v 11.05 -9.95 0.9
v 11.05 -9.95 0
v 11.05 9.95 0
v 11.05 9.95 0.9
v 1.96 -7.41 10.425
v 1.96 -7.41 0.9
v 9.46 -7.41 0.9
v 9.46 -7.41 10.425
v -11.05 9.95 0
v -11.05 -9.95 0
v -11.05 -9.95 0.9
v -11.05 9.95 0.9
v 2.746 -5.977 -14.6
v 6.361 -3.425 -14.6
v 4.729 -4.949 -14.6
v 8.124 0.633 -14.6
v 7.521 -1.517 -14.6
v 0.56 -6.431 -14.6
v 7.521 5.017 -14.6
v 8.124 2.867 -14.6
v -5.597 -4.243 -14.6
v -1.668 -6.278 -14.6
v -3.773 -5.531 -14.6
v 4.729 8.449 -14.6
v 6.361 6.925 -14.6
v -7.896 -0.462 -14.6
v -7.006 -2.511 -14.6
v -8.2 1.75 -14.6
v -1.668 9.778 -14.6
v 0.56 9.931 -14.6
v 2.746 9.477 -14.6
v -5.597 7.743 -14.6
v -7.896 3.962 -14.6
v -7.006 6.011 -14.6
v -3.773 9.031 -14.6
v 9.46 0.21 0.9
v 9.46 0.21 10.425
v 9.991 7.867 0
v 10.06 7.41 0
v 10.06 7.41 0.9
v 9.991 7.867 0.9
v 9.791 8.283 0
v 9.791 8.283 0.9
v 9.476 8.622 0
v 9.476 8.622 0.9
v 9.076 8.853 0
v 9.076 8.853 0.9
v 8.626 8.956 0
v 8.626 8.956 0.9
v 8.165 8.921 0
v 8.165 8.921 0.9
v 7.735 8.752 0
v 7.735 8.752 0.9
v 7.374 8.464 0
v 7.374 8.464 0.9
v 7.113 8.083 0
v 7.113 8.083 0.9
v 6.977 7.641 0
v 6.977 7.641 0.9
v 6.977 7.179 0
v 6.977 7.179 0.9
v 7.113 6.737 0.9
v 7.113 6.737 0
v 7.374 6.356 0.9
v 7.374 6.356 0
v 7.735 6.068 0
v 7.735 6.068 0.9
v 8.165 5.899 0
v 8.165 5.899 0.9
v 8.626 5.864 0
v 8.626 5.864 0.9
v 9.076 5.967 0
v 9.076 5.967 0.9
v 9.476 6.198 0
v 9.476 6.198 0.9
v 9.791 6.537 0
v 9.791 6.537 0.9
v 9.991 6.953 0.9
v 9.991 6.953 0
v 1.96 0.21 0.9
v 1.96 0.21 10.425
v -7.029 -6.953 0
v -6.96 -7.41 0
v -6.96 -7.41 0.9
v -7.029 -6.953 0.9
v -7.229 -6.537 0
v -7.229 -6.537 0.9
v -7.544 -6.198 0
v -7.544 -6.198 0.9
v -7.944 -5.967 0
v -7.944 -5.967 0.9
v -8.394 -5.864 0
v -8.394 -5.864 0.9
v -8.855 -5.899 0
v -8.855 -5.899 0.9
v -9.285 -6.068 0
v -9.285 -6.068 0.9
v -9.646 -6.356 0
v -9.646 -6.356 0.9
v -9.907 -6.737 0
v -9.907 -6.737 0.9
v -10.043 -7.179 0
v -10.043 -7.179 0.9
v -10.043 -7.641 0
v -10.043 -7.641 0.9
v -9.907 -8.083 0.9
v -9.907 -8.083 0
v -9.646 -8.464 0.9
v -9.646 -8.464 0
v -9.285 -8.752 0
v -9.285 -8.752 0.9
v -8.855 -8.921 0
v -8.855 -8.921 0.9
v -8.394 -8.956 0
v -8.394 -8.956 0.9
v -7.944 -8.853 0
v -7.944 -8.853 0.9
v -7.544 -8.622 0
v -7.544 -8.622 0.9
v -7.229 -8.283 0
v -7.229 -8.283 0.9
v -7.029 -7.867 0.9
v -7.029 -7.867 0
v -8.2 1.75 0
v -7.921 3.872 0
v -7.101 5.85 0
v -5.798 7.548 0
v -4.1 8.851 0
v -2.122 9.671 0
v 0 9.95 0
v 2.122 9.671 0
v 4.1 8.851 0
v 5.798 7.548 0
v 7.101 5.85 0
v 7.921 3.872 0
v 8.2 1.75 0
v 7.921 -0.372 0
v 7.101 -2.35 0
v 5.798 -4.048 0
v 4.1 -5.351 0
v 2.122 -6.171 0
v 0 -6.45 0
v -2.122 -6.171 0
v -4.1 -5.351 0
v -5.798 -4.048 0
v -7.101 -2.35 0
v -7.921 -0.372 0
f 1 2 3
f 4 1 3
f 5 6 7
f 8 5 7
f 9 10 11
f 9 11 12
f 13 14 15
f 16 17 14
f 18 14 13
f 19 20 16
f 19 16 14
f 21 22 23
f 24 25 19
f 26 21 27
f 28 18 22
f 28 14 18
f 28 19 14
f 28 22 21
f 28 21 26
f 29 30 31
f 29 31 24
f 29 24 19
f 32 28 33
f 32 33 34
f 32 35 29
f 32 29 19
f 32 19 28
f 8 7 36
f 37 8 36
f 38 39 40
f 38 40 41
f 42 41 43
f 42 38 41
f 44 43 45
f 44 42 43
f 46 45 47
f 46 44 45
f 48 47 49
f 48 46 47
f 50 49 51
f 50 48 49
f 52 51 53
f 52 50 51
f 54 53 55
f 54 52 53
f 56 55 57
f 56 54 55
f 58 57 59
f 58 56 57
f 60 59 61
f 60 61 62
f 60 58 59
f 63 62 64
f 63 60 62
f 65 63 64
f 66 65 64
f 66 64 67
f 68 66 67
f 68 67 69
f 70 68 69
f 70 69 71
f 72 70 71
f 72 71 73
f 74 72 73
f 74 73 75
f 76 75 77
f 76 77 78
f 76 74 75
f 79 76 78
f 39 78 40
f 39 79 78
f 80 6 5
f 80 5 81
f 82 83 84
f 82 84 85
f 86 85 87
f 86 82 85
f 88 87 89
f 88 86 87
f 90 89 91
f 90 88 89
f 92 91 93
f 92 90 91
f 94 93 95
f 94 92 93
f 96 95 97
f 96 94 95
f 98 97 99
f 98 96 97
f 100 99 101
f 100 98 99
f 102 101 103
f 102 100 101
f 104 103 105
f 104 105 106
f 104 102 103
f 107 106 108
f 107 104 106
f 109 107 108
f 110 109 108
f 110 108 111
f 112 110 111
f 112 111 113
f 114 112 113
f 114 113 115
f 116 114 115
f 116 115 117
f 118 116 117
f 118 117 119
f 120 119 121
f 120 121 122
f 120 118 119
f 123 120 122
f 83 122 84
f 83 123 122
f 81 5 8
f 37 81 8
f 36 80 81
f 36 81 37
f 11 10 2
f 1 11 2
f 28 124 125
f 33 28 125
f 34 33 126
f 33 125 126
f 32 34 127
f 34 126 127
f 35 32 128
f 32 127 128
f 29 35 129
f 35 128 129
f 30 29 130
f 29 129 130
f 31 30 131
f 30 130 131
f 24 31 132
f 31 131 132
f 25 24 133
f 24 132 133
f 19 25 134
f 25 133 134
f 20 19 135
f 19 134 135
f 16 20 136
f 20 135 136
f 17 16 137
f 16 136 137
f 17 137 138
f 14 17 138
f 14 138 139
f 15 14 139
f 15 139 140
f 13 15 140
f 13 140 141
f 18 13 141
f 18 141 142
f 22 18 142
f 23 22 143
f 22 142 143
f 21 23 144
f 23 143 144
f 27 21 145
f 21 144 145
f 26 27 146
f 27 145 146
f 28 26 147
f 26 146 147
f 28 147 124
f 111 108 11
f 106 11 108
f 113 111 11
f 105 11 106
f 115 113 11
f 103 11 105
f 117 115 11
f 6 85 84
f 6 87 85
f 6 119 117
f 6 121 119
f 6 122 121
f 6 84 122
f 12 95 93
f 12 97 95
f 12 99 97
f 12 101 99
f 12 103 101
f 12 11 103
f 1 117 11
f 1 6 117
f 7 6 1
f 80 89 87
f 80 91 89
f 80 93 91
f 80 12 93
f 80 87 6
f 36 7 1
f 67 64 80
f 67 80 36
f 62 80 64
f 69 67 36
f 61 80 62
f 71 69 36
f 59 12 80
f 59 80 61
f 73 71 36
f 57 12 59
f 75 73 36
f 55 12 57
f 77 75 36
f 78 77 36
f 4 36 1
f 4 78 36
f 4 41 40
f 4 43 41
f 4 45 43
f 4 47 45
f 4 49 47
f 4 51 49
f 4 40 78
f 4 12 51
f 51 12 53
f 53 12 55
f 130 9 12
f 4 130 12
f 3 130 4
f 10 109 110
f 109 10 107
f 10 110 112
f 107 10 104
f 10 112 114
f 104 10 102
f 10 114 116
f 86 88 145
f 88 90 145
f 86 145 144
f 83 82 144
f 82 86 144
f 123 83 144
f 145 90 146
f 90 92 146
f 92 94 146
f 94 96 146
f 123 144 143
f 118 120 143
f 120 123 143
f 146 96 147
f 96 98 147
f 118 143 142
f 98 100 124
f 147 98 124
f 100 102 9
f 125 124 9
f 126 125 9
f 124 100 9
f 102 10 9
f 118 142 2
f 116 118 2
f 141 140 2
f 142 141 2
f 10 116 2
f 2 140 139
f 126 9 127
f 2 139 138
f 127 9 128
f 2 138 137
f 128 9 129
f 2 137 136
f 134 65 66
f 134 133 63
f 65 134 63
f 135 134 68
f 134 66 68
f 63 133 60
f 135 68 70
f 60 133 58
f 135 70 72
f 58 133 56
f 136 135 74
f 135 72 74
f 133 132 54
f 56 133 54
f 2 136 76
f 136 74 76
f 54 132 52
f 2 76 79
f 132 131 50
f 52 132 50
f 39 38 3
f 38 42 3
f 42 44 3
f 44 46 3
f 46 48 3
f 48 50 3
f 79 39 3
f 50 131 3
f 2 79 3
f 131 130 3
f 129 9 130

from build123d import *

# Parameters (mm, degrees)
SKETCH2_W           = 22.1
SKETCH2_H           = 19.9
SKETCH2_R           = 1.55
BOSS_EXTRUDE1_DEPTH = 0.9
SKETCH3_W           = 7.5
SKETCH3_H           = 7.62
BOSS_EXTRUDE2_DEPTH = 9.525
SKETCH4_R           = 8.2
BOSS_EXTRUDE3_DEPTH = 14.6


with BuildPart() as part:
    # Sketch2 → Boss-Extrude1 (new body)
    with BuildSketch(Plane.XY):
        Rectangle(SKETCH2_W, SKETCH2_H)
        with Locations((-8.51, -7.41)):
            Circle(SKETCH2_R, mode=Mode.SUBTRACT)
        with Locations((8.51, 7.41)):
            Circle(SKETCH2_R, mode=Mode.SUBTRACT)
    extrude(amount=BOSS_EXTRUDE1_DEPTH)

    # Sketch3 → Boss-Extrude2 (add)
    with BuildSketch(Plane.XY.offset(0.9)):
        with Locations((5.710174181, -3.6)):
            Rectangle(SKETCH3_W, SKETCH3_H)
    extrude(amount=BOSS_EXTRUDE2_DEPTH)

    # Sketch4 → Boss-Extrude3 (add)
    with BuildSketch(Plane(origin=(0, 0, 0), x_dir=(-1, 0, 0), z_dir=(0, 0, -1))):
        with Locations((0, 1.75)):
            Circle(SKETCH4_R)
    extrude(amount=BOSS_EXTRUDE3_DEPTH)


solid = part.part
